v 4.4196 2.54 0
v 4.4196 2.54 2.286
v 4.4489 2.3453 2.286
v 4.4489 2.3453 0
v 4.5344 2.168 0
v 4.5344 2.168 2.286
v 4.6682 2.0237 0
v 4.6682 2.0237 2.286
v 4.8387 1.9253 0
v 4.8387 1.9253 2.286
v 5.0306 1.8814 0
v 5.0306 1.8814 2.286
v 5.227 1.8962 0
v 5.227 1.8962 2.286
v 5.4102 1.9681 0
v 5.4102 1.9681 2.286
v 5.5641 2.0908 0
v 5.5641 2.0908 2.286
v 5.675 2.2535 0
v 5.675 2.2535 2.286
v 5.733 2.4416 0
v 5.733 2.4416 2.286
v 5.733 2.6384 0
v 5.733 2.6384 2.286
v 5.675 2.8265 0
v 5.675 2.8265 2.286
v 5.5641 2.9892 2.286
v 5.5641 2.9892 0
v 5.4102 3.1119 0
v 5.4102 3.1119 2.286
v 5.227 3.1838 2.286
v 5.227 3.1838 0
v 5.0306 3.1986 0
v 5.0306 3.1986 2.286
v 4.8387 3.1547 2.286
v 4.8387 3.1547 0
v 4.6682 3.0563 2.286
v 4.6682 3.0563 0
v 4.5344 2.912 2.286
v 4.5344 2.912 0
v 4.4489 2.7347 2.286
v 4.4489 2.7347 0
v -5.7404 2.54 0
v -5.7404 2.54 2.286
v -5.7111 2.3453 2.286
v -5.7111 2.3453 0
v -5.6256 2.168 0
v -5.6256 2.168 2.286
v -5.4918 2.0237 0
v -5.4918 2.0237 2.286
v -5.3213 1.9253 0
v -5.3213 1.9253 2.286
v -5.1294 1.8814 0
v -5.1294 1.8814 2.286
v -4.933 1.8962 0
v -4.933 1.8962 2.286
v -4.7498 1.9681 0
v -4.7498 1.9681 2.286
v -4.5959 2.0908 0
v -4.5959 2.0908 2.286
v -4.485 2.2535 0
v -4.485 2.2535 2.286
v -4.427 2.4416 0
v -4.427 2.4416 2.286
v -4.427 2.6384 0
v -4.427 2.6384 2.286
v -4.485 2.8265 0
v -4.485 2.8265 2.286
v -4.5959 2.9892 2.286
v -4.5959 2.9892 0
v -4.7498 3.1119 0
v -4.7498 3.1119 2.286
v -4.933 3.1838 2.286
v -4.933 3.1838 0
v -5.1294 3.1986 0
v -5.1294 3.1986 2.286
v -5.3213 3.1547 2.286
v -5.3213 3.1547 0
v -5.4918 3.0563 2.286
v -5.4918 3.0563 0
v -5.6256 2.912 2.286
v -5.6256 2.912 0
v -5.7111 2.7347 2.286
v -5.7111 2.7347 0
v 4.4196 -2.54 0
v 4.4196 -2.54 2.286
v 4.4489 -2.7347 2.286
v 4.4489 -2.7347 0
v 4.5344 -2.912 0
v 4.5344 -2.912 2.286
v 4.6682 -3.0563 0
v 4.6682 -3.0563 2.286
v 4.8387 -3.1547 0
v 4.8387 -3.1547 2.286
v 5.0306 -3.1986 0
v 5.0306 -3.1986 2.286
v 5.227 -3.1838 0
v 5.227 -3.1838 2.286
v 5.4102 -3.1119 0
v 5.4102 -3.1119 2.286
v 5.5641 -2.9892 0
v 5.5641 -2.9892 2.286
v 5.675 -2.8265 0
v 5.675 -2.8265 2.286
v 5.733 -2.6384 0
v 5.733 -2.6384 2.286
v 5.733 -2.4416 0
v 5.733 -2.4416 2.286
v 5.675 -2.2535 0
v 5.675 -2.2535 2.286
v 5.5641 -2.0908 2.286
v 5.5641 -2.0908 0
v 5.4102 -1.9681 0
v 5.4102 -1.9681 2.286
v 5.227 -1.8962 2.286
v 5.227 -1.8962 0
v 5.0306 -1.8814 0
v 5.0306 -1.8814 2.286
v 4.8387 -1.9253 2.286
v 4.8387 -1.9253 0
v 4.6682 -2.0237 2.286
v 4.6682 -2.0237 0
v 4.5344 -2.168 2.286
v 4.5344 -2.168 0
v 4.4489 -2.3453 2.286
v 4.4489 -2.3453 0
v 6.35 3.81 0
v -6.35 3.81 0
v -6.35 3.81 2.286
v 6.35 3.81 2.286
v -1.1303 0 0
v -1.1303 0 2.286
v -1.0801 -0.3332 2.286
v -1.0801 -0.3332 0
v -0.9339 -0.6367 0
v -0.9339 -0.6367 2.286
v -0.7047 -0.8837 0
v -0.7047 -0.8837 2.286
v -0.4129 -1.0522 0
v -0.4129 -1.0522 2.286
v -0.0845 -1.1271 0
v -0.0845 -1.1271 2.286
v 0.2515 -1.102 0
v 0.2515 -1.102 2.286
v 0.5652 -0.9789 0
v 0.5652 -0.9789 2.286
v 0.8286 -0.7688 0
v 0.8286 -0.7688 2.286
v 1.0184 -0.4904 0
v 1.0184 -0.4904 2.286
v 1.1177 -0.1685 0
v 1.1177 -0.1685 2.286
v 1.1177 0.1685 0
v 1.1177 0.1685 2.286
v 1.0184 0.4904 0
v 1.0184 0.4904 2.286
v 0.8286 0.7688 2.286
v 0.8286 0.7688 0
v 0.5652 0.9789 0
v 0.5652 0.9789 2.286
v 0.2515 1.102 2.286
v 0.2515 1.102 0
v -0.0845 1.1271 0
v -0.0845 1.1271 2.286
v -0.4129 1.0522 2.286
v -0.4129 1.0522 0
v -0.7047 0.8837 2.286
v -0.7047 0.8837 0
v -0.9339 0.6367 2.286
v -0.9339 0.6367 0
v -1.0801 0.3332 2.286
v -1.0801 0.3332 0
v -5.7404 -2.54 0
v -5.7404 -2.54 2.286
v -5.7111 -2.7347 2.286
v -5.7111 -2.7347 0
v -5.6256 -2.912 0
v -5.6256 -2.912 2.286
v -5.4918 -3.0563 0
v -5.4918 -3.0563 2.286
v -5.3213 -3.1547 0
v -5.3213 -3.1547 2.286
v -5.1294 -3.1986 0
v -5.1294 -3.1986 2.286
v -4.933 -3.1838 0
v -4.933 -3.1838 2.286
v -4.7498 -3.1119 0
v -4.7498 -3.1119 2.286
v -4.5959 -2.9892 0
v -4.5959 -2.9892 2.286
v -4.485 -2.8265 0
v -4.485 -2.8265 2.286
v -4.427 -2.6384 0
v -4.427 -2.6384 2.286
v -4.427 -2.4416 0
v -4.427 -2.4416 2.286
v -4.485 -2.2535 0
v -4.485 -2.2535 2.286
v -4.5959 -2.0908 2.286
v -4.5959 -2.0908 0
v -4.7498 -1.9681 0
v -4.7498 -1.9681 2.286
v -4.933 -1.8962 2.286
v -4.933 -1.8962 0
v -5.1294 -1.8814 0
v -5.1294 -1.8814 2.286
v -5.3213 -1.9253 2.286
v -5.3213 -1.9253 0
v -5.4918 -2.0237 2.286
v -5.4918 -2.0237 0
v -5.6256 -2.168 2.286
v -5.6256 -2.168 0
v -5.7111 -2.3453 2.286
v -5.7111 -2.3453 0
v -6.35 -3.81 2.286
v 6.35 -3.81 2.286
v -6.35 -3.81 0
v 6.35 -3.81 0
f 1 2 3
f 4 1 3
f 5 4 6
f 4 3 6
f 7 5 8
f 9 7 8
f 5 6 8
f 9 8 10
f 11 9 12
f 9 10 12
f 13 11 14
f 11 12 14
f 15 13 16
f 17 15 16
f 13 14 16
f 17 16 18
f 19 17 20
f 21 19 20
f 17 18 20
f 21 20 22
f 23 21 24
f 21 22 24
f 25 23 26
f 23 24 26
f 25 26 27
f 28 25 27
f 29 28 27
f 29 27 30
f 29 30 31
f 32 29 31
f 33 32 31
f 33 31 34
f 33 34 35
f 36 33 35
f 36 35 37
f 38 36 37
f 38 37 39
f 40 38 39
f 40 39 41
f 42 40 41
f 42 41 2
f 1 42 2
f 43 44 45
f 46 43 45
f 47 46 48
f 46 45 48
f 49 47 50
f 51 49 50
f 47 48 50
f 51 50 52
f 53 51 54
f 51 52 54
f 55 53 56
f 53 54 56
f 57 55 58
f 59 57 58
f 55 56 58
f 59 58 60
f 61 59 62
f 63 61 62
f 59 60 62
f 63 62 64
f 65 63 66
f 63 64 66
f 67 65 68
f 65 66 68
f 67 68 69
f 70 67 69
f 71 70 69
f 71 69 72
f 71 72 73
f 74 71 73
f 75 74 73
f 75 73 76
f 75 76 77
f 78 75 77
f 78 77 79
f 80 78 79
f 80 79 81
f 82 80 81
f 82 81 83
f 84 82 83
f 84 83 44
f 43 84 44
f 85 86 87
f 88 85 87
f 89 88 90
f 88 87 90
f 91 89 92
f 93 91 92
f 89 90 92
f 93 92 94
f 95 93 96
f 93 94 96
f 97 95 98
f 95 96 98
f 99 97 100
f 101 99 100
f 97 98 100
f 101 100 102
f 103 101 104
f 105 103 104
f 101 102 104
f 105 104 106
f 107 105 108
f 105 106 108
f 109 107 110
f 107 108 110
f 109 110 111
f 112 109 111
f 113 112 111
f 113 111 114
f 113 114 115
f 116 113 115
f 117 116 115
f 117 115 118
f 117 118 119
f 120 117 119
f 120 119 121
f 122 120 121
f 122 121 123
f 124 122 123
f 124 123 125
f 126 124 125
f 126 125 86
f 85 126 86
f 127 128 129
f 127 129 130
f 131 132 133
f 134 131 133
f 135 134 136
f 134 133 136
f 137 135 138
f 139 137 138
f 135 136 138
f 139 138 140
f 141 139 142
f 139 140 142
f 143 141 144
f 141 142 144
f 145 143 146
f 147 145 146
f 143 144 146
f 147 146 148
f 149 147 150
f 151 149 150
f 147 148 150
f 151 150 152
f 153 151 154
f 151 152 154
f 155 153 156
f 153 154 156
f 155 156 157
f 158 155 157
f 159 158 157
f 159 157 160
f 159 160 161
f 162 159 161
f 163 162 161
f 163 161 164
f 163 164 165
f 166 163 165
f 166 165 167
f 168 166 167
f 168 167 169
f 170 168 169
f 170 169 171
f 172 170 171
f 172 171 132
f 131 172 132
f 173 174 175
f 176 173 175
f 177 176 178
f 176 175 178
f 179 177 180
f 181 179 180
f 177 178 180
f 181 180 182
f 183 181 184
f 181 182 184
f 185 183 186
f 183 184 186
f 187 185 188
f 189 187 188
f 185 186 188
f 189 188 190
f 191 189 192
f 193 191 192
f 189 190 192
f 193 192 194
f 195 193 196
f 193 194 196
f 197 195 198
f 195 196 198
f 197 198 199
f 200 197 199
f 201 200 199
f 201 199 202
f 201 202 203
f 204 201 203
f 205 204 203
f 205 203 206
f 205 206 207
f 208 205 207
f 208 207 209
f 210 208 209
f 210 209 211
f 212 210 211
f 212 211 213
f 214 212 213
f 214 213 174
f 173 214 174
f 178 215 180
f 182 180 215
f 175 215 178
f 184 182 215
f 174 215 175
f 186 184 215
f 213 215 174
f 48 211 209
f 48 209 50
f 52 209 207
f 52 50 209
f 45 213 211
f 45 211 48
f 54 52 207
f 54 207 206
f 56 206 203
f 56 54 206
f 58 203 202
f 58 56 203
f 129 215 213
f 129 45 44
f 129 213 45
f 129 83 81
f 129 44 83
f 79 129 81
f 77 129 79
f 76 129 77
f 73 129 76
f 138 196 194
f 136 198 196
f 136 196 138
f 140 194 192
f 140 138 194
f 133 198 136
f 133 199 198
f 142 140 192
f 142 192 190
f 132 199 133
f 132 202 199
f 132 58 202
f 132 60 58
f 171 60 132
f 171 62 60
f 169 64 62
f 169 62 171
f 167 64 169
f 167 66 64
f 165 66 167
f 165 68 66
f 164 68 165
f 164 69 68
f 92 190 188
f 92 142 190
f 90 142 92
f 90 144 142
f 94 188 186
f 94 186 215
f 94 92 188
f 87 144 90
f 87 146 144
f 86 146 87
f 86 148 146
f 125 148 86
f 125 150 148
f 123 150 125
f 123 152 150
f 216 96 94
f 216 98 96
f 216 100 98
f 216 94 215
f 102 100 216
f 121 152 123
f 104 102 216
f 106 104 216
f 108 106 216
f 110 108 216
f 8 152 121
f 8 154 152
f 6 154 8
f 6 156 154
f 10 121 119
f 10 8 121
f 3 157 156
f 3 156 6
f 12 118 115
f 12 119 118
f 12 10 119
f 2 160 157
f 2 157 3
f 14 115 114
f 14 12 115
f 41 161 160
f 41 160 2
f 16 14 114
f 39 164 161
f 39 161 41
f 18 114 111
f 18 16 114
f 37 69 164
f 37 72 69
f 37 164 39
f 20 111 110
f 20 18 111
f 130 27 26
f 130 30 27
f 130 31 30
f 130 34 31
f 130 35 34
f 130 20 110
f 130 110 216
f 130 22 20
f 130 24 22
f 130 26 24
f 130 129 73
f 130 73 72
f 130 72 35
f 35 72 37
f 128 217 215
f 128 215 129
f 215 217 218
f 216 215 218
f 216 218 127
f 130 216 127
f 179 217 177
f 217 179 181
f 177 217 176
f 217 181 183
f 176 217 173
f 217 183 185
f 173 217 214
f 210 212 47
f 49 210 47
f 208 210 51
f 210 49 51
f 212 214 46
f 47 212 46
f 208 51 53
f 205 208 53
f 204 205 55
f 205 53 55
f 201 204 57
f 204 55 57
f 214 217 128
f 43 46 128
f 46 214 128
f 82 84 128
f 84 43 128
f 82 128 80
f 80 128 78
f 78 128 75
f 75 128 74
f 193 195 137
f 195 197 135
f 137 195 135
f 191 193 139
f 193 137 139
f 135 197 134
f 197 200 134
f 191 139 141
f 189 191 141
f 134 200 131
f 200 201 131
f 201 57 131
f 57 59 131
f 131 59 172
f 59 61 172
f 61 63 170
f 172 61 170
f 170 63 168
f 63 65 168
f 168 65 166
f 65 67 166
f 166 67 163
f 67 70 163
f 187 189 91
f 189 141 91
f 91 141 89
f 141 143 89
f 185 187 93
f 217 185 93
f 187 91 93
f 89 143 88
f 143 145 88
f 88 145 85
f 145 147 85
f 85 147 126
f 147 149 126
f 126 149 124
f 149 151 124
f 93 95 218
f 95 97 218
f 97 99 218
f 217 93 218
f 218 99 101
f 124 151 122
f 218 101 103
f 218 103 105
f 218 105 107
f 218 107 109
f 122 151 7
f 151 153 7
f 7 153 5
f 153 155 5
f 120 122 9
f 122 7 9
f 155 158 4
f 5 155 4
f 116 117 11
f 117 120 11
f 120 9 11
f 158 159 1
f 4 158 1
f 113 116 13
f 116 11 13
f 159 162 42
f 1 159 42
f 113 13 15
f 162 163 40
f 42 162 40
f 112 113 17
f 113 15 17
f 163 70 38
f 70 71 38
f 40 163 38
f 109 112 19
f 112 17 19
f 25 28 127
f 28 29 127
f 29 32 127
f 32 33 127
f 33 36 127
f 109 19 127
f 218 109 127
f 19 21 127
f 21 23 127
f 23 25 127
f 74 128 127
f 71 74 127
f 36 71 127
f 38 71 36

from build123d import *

# Parameters (mm, degrees)
F0_W     = 12.7
F0_H     = 7.62
F0_W_2   = 10.16
F0_H_2   = 5.08
F1_DEPTH = 2.286
F2_D     = 1.3208
F3_D     = 2.2606


with BuildPart() as f1:
    # F0 (on Top) → F1 (new body)
    with BuildSketch(Plane.XY):
        Rectangle(F0_W, F0_H)
        Rectangle(F0_W_2, F0_H_2, mode=Mode.SUBTRACT)
        Rectangle(F0_W_2, F0_H_2)
    extrude(amount=F1_DEPTH)

    # F2 (through all)
    with Locations(Plane(origin=(0, 0, 0), x_dir=(1, 0, 0), z_dir=(0, 0, -1))):
        with Locations((-5.08, -2.54), (5.08, -2.54), (5.08, 2.54), (-5.08, 2.54)):
            Hole(F2_D / 2)

    # F3 (through all)
    with Locations(Plane(origin=(0, 0, 0), x_dir=(1, 0, 0), z_dir=(0, 0, -1))):
        with Locations((0, 0)):
            Hole(F3_D / 2)


solid = f1.part
